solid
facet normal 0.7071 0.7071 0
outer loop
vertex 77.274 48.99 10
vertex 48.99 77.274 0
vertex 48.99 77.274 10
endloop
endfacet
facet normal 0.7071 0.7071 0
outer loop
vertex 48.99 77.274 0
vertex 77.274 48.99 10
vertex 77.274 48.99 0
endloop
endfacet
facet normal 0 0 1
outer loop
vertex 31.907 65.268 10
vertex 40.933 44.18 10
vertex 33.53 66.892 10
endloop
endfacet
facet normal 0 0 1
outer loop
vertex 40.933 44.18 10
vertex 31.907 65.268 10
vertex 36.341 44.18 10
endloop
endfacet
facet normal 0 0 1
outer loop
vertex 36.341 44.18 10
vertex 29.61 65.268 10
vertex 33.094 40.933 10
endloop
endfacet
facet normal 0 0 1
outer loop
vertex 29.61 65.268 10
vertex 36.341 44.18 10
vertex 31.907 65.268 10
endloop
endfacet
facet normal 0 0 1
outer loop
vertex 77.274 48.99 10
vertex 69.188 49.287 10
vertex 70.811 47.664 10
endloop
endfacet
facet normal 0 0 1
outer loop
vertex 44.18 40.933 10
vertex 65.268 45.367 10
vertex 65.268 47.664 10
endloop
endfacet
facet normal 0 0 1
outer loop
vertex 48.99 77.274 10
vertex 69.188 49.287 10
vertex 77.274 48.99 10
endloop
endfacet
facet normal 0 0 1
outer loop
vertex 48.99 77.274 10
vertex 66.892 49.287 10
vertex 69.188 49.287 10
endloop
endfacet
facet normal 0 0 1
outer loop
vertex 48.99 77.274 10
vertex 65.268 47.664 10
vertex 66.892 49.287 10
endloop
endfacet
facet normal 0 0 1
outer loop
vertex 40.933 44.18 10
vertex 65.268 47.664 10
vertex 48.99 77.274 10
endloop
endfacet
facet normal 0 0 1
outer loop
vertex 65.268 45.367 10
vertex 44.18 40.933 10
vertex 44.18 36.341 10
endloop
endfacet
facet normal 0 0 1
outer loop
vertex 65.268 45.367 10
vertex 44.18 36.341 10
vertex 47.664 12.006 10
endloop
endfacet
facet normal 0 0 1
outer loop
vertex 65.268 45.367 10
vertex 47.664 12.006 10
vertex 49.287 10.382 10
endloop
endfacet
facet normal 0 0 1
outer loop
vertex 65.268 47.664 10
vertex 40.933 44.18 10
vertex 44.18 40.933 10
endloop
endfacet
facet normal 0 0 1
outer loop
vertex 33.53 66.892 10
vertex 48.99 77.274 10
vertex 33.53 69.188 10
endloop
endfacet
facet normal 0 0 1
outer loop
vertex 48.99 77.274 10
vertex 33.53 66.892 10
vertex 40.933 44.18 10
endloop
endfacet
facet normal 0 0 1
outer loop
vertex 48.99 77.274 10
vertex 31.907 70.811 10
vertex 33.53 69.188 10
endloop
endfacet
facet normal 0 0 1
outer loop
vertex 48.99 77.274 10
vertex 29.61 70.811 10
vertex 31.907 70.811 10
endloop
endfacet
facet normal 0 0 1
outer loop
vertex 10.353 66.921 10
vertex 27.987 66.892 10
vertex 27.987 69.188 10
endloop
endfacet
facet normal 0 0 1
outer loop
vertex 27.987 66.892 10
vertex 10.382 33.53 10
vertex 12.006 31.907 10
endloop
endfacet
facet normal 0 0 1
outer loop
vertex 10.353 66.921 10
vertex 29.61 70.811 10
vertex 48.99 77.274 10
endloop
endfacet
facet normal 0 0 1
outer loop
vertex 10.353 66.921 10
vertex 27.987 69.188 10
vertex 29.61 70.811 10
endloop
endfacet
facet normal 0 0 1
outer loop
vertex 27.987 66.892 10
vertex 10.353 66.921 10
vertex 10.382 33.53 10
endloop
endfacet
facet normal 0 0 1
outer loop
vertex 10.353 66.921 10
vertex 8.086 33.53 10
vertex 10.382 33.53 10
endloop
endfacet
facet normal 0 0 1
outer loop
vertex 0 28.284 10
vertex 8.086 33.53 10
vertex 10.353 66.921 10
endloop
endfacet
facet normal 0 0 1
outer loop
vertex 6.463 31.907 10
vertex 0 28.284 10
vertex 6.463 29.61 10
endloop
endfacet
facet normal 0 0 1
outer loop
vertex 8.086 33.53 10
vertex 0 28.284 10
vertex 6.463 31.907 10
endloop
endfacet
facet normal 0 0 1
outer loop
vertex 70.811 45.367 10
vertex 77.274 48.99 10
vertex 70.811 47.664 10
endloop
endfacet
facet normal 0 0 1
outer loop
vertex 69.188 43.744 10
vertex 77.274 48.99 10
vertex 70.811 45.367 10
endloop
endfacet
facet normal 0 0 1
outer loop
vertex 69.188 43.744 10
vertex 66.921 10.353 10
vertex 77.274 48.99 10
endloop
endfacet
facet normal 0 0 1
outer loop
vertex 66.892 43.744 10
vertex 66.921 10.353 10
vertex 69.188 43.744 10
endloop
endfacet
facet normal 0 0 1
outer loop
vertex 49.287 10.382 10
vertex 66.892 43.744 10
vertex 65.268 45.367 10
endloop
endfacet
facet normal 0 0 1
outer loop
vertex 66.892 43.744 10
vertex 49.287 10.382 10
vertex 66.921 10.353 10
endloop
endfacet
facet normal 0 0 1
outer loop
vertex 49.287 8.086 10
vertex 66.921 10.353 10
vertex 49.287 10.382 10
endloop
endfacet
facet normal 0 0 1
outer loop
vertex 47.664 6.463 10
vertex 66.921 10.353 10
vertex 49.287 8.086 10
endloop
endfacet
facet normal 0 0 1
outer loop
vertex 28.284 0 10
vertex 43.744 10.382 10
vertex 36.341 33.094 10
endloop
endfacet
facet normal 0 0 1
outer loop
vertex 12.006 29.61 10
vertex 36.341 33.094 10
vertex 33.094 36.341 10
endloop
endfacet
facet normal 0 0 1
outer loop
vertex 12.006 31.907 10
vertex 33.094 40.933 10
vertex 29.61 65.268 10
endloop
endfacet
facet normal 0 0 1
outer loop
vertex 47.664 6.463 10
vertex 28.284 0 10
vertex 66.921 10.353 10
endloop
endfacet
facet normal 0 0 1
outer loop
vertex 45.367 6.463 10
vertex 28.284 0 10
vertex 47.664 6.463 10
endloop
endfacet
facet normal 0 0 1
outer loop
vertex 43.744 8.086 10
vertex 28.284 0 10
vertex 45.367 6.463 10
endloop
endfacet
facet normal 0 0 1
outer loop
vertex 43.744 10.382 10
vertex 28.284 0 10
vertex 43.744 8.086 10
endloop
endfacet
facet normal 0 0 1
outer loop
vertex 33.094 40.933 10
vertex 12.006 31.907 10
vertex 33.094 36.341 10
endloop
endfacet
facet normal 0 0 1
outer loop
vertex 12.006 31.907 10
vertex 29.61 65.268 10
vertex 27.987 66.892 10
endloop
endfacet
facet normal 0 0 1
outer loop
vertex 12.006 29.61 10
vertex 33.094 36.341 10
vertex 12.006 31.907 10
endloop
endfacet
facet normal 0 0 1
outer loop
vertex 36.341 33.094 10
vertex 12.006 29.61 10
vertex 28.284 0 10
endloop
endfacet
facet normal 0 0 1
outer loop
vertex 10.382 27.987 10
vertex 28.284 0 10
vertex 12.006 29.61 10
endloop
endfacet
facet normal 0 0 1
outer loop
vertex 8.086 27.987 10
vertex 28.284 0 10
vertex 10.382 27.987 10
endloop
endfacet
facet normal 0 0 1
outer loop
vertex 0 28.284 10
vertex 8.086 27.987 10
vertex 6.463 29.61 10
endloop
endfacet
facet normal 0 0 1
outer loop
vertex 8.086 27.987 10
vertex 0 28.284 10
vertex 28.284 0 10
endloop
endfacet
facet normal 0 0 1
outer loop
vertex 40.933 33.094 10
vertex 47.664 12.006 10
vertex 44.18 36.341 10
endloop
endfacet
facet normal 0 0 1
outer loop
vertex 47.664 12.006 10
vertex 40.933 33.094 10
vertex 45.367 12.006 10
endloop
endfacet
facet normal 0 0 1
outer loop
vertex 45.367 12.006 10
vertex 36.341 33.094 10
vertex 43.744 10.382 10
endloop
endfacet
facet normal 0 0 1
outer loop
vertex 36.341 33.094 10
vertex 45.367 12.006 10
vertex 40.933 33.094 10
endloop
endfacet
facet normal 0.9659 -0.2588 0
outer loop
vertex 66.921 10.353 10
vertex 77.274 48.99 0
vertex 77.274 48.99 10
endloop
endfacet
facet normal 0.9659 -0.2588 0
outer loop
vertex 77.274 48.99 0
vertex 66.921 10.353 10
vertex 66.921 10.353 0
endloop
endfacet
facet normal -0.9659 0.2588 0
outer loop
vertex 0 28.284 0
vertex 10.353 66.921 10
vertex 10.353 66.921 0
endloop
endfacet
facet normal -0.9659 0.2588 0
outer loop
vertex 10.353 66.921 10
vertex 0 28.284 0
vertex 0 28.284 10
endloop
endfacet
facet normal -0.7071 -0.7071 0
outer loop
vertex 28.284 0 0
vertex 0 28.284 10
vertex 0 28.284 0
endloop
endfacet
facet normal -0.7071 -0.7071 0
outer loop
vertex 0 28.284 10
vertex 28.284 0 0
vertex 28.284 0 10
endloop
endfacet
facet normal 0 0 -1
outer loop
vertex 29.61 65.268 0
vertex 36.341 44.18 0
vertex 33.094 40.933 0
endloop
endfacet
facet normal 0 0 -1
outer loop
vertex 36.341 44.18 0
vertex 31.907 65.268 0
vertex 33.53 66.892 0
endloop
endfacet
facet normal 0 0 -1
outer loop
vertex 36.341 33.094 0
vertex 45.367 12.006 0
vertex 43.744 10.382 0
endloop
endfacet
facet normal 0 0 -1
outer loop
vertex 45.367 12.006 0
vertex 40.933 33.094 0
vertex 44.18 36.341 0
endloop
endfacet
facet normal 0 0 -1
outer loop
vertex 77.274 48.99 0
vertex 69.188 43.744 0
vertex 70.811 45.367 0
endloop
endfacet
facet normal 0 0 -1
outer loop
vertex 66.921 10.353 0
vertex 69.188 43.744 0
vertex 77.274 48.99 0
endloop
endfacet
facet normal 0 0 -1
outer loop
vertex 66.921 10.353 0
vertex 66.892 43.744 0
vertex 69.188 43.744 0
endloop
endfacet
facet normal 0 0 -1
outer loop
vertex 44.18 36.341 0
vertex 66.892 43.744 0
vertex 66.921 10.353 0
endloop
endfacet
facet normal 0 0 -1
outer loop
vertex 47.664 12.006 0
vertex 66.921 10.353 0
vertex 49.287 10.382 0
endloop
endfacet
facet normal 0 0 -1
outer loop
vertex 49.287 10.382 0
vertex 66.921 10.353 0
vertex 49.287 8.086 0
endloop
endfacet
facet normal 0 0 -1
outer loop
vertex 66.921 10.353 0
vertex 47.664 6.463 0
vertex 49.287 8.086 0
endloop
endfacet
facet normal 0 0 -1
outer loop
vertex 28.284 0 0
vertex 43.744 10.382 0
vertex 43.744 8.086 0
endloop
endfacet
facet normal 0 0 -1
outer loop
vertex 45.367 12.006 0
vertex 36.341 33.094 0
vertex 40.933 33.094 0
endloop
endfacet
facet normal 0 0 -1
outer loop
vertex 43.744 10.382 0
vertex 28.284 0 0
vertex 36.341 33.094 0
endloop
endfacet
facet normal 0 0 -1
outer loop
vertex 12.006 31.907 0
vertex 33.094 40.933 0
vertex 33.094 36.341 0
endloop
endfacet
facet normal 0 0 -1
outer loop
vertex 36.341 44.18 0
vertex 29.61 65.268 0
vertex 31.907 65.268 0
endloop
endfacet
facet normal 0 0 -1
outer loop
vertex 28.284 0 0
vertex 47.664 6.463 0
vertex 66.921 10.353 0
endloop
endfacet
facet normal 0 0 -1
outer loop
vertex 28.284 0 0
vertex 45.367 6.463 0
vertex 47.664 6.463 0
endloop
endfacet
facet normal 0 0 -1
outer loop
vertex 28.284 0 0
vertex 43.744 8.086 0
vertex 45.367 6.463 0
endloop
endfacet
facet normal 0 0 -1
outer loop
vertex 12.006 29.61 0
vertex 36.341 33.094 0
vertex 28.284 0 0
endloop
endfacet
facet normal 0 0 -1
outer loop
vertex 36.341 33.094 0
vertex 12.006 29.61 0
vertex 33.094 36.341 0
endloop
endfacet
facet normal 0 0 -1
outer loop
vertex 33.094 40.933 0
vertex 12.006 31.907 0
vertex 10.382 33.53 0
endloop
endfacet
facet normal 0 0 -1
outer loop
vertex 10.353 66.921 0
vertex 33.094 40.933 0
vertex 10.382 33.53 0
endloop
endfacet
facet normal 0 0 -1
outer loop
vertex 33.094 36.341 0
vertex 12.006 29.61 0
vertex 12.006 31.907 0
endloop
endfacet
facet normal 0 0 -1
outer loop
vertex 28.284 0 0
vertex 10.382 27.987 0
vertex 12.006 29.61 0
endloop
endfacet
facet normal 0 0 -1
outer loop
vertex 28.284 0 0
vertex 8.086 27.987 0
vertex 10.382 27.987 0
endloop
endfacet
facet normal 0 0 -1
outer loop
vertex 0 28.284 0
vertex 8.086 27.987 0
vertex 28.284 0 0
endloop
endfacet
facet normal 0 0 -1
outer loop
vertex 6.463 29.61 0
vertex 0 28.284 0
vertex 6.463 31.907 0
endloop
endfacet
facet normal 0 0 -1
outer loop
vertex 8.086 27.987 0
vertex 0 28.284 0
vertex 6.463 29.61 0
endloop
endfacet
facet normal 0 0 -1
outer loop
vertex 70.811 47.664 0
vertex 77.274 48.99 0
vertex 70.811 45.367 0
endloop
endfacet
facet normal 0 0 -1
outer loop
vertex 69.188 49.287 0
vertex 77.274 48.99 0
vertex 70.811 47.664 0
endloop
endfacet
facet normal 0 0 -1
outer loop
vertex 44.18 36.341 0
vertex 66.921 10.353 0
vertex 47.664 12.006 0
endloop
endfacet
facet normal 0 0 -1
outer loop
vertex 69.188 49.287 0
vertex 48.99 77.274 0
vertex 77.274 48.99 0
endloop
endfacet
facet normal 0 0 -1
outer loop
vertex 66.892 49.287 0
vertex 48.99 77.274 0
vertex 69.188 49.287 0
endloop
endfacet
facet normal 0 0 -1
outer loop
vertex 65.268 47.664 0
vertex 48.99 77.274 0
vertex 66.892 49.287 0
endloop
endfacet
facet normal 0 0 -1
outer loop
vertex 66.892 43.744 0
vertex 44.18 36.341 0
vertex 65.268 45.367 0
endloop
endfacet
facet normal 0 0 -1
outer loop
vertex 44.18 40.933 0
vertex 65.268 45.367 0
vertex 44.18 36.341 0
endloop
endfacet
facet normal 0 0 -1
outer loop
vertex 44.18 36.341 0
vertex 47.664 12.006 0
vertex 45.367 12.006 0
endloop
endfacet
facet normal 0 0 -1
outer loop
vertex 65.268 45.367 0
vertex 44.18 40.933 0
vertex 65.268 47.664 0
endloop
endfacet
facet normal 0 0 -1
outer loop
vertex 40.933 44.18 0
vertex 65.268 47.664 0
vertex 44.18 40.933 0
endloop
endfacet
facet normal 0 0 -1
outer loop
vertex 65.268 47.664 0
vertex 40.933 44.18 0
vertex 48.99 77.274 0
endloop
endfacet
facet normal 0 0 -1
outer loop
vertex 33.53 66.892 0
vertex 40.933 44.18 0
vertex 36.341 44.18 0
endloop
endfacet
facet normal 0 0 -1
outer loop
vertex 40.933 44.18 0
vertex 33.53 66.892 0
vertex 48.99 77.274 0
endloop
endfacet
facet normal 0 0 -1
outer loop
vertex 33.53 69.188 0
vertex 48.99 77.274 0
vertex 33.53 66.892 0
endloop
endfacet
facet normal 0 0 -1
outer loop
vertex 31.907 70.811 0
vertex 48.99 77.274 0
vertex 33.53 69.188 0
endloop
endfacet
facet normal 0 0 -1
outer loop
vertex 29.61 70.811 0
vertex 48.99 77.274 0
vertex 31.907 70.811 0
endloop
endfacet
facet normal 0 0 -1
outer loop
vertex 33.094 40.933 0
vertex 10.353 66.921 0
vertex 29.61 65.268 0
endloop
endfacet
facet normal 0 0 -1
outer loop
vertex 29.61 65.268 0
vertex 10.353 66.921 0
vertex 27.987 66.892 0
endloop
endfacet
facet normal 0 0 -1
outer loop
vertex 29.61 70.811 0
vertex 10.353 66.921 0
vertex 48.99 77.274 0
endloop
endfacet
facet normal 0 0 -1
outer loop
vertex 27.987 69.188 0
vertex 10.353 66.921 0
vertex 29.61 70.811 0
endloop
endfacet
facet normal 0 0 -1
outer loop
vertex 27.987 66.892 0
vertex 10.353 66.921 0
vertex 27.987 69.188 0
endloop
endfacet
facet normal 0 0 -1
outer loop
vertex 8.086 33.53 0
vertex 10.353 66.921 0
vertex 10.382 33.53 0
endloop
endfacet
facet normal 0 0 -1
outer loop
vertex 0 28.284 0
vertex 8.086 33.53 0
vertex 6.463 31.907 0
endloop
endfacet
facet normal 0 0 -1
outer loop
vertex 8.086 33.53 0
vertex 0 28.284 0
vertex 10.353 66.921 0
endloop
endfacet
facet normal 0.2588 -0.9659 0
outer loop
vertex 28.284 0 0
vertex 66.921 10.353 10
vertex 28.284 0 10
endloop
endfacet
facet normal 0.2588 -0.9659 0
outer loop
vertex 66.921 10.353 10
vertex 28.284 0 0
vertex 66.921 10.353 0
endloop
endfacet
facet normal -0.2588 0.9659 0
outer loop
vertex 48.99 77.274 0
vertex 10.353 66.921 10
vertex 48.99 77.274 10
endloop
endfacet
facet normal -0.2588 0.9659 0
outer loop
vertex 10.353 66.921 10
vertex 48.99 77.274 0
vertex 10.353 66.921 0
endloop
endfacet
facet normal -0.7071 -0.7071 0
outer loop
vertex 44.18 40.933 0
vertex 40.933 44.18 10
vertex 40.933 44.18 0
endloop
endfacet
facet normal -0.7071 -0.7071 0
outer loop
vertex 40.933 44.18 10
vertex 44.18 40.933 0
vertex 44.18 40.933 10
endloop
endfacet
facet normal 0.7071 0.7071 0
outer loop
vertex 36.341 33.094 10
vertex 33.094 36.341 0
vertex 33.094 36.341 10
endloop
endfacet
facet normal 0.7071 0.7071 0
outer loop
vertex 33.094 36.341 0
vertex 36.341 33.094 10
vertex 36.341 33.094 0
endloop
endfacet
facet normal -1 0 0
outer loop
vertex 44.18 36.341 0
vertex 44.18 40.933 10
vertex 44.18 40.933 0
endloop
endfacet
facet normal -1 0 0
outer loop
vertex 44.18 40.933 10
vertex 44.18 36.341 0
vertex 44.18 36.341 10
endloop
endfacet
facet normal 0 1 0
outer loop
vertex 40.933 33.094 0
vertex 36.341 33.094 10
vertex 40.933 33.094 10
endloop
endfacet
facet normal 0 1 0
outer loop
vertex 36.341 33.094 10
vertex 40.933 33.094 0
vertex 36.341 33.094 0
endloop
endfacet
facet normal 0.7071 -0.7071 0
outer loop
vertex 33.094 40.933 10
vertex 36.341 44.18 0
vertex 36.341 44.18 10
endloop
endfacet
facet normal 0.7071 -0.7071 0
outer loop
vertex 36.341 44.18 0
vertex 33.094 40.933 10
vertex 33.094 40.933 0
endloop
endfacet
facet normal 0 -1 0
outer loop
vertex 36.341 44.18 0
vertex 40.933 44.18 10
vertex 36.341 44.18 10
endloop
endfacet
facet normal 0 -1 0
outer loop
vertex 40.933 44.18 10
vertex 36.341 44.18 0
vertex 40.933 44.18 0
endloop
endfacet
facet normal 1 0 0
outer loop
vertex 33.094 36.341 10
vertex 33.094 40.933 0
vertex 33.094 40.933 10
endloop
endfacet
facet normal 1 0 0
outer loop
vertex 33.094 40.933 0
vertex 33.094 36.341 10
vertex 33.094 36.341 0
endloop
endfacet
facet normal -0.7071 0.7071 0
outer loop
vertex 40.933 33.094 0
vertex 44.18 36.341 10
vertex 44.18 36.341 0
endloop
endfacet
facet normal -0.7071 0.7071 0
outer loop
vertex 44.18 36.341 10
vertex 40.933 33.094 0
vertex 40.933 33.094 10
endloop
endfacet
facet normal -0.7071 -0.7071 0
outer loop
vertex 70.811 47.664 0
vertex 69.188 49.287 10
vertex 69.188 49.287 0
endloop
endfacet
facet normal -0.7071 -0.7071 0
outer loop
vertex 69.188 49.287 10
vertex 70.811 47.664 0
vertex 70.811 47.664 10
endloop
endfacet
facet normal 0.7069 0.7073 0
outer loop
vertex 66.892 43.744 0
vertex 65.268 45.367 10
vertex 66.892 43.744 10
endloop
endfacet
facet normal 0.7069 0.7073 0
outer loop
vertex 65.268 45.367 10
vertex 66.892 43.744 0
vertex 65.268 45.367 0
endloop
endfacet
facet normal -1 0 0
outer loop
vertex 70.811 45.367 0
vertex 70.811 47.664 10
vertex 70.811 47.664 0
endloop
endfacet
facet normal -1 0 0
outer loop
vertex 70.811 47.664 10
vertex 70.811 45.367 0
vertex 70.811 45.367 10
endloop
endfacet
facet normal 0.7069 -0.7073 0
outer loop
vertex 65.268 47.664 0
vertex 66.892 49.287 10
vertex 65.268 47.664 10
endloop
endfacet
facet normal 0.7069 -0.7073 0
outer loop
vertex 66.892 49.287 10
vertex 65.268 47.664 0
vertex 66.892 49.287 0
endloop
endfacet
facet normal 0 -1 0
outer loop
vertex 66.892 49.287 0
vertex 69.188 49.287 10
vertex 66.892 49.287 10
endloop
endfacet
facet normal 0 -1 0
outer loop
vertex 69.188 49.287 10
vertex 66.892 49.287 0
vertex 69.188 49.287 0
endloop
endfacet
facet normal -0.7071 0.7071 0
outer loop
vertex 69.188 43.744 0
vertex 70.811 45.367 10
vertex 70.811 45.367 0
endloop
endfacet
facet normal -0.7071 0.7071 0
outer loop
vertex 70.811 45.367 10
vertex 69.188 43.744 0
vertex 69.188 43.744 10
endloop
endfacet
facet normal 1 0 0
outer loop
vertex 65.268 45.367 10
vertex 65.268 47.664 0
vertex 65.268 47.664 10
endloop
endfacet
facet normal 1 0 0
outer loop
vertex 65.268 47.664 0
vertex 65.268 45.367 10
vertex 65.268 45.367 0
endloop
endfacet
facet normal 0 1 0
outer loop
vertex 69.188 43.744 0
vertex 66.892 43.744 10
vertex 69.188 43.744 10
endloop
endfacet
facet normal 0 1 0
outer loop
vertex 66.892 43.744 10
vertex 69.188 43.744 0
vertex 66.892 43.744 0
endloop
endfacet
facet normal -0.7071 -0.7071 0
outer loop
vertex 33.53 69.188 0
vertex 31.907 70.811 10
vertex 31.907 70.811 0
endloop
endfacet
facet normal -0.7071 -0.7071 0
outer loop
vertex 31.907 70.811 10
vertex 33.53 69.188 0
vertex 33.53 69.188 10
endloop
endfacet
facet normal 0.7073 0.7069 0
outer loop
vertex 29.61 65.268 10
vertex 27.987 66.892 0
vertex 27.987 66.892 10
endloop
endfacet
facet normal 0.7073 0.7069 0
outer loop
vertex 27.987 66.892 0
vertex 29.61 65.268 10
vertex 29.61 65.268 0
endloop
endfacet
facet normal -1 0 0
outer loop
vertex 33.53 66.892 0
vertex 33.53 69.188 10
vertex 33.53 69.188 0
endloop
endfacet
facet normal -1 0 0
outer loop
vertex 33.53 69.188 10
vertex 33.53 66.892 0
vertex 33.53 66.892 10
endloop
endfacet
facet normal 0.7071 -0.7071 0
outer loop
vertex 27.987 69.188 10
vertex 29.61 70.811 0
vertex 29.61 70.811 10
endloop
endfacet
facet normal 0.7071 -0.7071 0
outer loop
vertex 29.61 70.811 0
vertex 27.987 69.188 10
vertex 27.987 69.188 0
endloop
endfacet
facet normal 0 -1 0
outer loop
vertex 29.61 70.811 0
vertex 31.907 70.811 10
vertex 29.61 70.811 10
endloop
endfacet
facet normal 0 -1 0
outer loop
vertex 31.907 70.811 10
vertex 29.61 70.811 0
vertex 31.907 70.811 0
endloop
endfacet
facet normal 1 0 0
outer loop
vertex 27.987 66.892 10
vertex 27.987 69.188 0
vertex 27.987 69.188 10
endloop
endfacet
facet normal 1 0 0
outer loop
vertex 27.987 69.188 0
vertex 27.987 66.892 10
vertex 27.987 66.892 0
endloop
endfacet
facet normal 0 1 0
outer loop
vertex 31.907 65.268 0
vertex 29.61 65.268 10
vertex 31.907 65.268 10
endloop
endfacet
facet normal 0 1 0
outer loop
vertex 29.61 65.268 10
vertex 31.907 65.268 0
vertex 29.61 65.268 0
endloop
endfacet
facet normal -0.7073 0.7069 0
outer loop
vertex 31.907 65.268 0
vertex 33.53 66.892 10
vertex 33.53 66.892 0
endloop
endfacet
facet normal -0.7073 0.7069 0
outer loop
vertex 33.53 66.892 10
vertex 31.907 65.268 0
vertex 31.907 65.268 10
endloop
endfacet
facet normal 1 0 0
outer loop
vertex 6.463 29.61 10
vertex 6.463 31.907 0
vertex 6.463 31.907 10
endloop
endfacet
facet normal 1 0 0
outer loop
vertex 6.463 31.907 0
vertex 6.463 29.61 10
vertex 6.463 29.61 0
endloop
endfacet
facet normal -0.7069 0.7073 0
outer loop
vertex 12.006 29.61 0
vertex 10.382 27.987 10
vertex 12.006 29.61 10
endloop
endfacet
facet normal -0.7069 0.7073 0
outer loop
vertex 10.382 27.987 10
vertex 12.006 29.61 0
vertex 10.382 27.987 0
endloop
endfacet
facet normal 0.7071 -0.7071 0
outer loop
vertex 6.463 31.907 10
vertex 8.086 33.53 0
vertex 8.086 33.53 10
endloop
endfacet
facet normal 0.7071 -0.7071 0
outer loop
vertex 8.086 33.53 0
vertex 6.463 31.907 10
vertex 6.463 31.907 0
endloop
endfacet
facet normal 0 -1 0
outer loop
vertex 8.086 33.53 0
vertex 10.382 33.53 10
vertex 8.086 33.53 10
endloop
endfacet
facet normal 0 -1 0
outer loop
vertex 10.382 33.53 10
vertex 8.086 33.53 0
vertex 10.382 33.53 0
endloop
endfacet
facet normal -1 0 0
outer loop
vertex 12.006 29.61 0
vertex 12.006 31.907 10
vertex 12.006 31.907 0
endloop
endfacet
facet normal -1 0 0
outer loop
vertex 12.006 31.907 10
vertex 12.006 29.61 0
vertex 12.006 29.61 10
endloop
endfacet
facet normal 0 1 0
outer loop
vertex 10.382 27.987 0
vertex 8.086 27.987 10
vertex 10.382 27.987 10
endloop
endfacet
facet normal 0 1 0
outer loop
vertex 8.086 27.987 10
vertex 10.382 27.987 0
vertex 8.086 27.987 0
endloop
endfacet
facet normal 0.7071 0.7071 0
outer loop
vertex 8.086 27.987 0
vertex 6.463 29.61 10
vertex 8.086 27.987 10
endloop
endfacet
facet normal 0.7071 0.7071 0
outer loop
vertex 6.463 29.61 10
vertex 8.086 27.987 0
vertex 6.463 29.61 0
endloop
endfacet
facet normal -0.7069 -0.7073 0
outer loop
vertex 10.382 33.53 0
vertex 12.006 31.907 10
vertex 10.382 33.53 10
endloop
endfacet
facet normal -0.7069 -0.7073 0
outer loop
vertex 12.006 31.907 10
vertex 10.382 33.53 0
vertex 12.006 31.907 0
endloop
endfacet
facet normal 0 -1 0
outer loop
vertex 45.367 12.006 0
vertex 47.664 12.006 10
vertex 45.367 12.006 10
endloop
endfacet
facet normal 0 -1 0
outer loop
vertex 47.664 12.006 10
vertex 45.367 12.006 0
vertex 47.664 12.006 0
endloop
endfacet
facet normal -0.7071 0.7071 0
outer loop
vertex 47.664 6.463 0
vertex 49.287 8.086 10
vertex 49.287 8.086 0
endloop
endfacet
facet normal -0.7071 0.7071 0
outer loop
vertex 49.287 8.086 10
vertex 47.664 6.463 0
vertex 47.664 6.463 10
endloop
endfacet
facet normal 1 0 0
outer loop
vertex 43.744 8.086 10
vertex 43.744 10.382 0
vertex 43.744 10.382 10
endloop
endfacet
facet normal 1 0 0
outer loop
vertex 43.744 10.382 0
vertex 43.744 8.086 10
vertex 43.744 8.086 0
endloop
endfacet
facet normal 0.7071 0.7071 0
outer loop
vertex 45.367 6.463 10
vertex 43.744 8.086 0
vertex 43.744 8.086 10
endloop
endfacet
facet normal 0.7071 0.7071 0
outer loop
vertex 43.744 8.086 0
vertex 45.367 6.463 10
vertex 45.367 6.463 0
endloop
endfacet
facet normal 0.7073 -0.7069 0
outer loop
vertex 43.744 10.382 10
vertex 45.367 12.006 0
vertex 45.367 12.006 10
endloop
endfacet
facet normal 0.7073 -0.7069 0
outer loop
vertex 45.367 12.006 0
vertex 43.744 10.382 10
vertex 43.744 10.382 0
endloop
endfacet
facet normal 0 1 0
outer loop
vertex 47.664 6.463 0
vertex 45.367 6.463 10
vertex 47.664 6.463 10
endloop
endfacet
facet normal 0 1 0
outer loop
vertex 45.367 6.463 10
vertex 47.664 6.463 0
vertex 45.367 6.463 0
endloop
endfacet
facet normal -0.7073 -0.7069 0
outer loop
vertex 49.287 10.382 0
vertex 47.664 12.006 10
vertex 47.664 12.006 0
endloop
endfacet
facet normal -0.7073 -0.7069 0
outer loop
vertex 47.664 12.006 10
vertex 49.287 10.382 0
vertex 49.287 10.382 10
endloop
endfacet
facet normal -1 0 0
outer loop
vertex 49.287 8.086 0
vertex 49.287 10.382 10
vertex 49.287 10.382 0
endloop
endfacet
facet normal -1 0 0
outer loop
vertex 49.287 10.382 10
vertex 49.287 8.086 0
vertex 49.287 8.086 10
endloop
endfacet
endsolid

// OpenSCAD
$fn = 32;

// ----------------------------------------------------------------------
// Polygon plate: 6-gon R40, 4 bolt windows
// ----------------------------------------------------------------------

// --- parameters (mm) ---
sides = 6;                // number of polygon sides
plate_r = 40;             // circumscribed radius of the polygon
bore_r = 6;               // centre bore radius
bolts = 4;                // number of bolt windows
ring_r = 30.44;           // bolt-circle radius
bolt_r = 3;               // bolt window radius
plate_t = 10;             // plate thickness, Z (extrusion height)

plate_d = 2 * plate_r;  // circumscribed diameter
bore_d = 2 * bore_r;  // centre bore diameter
bolt_d = 2 * bolt_r;  // bolt window diameter
ring_d = 2 * ring_r;  // bolt-circle diameter

profile = [[77.274, 48.99], [48.99, 77.274], [10.353, 66.921], [0, 28.284], [28.284, 0], [66.921, 10.353]];  // primary outline, 6 points, counter clockwise
void_1 = [[44.18, 40.933], [40.933, 44.18], [36.341, 44.18], [33.094, 40.933], [33.094, 36.341], [36.341, 33.094], [40.933, 33.094], [44.18, 36.341]];  // centre bore, 8 points
void_2 = [[70.811, 47.664], [69.188, 49.287], [66.892, 49.287], [65.268, 47.664], [65.268, 45.367], [66.892, 43.744], [69.188, 43.744], [70.811, 45.367]];  // bolt window 1, 8 points
void_3 = [[33.53, 69.188], [31.907, 70.811], [29.61, 70.811], [27.987, 69.188], [27.987, 66.892], [29.61, 65.268], [31.907, 65.268], [33.53, 66.892]];  // bolt window 2, 8 points
void_4 = [[12.006, 31.907], [10.382, 33.53], [8.086, 33.53], [6.463, 31.907], [6.463, 29.61], [8.086, 27.987], [10.382, 27.987], [12.006, 29.61]];  // bolt window 3, 8 points
void_5 = [[49.287, 10.382], [47.664, 12.006], [45.367, 12.006], [43.744, 10.382], [43.744, 8.086], [45.367, 6.463], [47.664, 6.463], [49.287, 8.086]];  // bolt window 4, 8 points

// --- the one profile operation ---
difference() {
  linear_extrude(height = plate_t) polygon(points = profile);
  translate([0, 0, -1])
    linear_extrude(height = plate_t + 2) polygon(points = void_1);
  translate([0, 0, -1])
    linear_extrude(height = plate_t + 2) polygon(points = void_2);
  translate([0, 0, -1])
    linear_extrude(height = plate_t + 2) polygon(points = void_3);
  translate([0, 0, -1])
    linear_extrude(height = plate_t + 2) polygon(points = void_4);
  translate([0, 0, -1])
    linear_extrude(height = plate_t + 2) polygon(points = void_5);
}
